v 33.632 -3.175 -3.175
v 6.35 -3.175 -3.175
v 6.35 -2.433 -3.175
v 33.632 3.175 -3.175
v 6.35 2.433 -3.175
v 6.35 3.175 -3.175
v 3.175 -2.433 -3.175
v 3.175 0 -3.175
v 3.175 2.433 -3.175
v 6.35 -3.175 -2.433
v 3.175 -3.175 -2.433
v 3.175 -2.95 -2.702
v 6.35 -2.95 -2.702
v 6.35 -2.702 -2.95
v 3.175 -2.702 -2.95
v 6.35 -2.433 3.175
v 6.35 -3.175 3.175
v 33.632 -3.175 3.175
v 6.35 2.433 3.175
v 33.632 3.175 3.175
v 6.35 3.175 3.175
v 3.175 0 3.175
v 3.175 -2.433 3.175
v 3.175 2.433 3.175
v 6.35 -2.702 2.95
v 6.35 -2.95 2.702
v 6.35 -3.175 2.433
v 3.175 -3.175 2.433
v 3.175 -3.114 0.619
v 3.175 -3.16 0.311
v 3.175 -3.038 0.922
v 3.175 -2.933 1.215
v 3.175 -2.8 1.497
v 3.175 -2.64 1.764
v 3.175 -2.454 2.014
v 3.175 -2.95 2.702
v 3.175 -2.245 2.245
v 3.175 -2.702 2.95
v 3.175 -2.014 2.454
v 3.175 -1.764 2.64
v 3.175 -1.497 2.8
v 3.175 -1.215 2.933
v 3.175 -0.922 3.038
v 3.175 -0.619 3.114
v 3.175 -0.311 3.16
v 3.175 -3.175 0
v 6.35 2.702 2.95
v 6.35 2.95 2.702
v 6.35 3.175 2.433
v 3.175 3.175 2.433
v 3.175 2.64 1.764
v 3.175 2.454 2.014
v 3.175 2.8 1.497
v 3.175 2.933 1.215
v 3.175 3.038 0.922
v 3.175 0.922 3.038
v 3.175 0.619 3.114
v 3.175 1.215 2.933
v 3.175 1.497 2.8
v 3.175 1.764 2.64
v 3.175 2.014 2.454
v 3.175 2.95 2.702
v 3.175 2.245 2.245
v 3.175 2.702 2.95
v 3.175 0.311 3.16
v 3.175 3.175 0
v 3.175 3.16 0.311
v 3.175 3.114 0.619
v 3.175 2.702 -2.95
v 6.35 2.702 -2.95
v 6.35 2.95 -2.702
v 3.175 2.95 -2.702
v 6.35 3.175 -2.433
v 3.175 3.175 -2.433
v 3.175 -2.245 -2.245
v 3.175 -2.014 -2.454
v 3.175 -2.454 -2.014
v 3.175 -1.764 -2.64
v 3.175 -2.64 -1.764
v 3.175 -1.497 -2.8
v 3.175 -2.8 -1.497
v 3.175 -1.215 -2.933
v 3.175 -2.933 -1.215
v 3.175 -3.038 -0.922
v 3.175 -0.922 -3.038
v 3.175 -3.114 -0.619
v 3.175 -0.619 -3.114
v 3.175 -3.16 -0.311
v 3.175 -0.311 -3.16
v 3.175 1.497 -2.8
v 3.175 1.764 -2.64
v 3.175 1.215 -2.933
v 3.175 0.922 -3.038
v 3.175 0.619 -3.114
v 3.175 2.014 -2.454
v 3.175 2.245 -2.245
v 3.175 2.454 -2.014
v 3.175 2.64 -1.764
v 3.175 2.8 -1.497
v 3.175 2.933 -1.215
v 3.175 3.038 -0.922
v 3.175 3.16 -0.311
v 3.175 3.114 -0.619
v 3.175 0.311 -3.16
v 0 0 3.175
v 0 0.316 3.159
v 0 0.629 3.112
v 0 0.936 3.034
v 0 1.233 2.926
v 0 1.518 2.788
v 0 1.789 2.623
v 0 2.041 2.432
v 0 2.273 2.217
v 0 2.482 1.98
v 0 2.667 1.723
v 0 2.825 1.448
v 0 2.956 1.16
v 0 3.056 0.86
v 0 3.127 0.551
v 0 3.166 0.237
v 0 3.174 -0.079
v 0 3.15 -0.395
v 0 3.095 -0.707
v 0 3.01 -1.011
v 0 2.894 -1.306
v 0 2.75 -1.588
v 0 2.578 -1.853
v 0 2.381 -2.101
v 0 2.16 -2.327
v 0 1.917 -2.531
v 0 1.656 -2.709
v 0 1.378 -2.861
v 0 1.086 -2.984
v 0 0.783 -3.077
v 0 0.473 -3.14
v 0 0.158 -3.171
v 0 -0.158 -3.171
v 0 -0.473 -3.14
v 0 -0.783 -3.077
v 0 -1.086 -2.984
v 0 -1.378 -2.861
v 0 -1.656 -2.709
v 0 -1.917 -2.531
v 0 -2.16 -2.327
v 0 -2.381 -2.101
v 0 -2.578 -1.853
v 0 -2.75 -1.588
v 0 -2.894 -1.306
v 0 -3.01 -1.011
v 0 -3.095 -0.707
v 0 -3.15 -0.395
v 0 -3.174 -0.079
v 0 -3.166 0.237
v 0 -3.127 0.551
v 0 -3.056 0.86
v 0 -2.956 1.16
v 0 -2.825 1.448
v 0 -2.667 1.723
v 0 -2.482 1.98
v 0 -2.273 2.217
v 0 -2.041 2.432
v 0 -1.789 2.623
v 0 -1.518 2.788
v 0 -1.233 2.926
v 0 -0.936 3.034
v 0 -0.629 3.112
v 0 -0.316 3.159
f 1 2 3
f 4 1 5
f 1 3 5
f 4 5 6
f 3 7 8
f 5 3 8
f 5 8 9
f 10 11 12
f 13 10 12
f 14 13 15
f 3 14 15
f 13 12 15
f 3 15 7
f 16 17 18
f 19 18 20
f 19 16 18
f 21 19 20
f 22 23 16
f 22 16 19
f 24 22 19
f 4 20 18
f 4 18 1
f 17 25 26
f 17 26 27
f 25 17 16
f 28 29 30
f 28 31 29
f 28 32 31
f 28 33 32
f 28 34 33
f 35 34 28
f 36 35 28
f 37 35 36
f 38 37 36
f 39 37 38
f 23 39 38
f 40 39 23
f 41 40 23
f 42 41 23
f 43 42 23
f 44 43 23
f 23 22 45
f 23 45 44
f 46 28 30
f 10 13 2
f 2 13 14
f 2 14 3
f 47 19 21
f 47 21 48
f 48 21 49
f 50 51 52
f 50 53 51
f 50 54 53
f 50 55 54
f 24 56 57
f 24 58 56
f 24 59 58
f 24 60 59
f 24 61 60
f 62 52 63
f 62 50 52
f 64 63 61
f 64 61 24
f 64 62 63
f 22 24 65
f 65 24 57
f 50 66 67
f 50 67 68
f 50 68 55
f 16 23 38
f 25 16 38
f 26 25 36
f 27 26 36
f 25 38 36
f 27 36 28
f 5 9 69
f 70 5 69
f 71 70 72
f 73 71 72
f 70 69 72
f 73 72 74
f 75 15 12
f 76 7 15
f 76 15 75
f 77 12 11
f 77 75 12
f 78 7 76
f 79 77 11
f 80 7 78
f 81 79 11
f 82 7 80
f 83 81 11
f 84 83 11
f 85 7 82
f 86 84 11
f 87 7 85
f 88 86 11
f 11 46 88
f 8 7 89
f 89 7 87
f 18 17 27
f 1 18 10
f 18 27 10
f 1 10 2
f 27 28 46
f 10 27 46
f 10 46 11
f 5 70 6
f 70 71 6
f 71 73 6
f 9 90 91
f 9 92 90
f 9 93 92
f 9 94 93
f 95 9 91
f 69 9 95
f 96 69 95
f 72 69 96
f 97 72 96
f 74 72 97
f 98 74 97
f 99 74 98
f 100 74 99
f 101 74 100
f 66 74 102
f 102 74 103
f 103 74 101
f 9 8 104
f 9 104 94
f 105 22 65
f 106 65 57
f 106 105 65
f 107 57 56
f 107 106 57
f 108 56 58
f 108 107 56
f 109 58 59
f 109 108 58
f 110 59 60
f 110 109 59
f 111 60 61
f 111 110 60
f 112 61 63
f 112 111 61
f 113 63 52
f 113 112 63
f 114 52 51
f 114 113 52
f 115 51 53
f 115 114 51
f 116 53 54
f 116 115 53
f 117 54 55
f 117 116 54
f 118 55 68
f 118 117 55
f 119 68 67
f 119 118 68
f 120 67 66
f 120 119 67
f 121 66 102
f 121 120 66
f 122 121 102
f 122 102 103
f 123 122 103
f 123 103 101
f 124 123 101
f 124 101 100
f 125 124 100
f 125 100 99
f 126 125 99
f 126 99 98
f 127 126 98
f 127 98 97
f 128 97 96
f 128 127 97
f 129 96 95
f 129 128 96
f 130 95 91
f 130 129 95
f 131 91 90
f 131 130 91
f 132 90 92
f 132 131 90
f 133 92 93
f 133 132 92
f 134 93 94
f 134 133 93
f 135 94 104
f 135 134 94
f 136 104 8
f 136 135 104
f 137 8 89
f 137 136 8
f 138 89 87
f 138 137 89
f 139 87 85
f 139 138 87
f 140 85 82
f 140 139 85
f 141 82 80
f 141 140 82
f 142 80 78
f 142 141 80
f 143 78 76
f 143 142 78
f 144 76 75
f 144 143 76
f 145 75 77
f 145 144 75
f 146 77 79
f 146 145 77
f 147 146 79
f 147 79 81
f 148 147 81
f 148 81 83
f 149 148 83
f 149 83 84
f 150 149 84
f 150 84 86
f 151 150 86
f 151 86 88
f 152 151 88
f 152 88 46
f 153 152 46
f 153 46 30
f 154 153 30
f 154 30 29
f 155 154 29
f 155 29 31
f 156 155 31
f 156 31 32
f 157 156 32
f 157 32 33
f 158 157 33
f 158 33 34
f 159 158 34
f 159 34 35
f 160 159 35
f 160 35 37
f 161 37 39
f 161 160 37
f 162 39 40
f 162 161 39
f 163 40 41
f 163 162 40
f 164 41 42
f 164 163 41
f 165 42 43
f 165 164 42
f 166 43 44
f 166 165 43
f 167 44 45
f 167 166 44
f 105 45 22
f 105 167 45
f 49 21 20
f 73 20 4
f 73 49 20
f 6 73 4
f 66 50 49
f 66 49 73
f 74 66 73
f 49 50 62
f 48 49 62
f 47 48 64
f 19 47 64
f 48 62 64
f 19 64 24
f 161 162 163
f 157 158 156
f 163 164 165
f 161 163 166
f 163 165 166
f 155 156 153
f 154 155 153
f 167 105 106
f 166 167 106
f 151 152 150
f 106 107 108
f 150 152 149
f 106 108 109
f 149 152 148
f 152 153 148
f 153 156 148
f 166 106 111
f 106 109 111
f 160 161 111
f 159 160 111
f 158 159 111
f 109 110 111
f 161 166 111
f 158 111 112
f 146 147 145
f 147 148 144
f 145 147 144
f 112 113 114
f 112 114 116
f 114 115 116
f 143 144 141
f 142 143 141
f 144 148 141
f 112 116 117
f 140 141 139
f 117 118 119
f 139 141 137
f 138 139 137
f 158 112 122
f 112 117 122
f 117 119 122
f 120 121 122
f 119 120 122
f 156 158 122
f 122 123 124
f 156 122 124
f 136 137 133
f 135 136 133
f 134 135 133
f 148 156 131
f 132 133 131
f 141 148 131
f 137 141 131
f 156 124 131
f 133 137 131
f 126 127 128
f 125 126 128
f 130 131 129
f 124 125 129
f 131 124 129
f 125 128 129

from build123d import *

# Parameters (mm, degrees)
SKETCH1_W           = 6.35
SKETCH1_H           = 6.35
BOSS_EXTRUDE1_DEPTH = 33.63214
SKETCH3_W           = 9.525
SKETCH3_H           = 9.525
SKETCH3_R           = 3.175
CUT_EXTRUDE2_DEPTH  = 3.175
SKETCH4_W           = 7.9375
SKETCH4_H           = 7.9375
CUT_EXTRUDE3_DEPTH  = 3.175


with BuildPart() as part:
    # Sketch1 → Boss-Extrude1 (new body)
    with BuildSketch(Plane(origin=(0, 0, 0), x_dir=(0, 0, -1), z_dir=(1, 0, 0))):
        Rectangle(SKETCH1_W, SKETCH1_H)
    extrude(amount=BOSS_EXTRUDE1_DEPTH)

    # Sketch3 → Cut-Extrude2 (cut)
    with BuildSketch(Plane.ZY):
        Rectangle(SKETCH3_W, SKETCH3_H)
        Circle(SKETCH3_R, mode=Mode.SUBTRACT)
    extrude(amount=-CUT_EXTRUDE2_DEPTH, mode=Mode.SUBTRACT)

    # Sketch4 → Cut-Extrude3 (cut)
    with BuildSketch(Plane(origin=(3.175, 0, 0), x_dir=(0, 0, -1), z_dir=(1, 0, 0))):
        Rectangle(SKETCH4_W, SKETCH4_H)
        with BuildLine():
            Line((3.175, -2.432976572), (3.175, 2.432976572))
            ThreePointArc((3.175, 2.432976572), (2.828427125, 2.828427125), (2.432976572, 3.175))
            Line((2.432976572, 3.175), (-2.432976572, 3.175))
            ThreePointArc((-2.432976572, 3.175), (-2.828427125, 2.828427125), (-3.175, 2.432976572))
            Line((-3.175, 2.432976572), (-3.175, -2.432976572))
            ThreePointArc((-3.175, -2.432976572), (-2.828427125, -2.828427125), (-2.432976572, -3.175))
            Line((-2.432976572, -3.175), (2.432976572, -3.175))
            ThreePointArc((2.432976572, -3.175), (2.828427125, -2.828427125), (3.175, -2.432976572))
        make_face(mode=Mode.SUBTRACT)
    extrude(amount=CUT_EXTRUDE3_DEPTH, mode=Mode.SUBTRACT)


solid = part.part
